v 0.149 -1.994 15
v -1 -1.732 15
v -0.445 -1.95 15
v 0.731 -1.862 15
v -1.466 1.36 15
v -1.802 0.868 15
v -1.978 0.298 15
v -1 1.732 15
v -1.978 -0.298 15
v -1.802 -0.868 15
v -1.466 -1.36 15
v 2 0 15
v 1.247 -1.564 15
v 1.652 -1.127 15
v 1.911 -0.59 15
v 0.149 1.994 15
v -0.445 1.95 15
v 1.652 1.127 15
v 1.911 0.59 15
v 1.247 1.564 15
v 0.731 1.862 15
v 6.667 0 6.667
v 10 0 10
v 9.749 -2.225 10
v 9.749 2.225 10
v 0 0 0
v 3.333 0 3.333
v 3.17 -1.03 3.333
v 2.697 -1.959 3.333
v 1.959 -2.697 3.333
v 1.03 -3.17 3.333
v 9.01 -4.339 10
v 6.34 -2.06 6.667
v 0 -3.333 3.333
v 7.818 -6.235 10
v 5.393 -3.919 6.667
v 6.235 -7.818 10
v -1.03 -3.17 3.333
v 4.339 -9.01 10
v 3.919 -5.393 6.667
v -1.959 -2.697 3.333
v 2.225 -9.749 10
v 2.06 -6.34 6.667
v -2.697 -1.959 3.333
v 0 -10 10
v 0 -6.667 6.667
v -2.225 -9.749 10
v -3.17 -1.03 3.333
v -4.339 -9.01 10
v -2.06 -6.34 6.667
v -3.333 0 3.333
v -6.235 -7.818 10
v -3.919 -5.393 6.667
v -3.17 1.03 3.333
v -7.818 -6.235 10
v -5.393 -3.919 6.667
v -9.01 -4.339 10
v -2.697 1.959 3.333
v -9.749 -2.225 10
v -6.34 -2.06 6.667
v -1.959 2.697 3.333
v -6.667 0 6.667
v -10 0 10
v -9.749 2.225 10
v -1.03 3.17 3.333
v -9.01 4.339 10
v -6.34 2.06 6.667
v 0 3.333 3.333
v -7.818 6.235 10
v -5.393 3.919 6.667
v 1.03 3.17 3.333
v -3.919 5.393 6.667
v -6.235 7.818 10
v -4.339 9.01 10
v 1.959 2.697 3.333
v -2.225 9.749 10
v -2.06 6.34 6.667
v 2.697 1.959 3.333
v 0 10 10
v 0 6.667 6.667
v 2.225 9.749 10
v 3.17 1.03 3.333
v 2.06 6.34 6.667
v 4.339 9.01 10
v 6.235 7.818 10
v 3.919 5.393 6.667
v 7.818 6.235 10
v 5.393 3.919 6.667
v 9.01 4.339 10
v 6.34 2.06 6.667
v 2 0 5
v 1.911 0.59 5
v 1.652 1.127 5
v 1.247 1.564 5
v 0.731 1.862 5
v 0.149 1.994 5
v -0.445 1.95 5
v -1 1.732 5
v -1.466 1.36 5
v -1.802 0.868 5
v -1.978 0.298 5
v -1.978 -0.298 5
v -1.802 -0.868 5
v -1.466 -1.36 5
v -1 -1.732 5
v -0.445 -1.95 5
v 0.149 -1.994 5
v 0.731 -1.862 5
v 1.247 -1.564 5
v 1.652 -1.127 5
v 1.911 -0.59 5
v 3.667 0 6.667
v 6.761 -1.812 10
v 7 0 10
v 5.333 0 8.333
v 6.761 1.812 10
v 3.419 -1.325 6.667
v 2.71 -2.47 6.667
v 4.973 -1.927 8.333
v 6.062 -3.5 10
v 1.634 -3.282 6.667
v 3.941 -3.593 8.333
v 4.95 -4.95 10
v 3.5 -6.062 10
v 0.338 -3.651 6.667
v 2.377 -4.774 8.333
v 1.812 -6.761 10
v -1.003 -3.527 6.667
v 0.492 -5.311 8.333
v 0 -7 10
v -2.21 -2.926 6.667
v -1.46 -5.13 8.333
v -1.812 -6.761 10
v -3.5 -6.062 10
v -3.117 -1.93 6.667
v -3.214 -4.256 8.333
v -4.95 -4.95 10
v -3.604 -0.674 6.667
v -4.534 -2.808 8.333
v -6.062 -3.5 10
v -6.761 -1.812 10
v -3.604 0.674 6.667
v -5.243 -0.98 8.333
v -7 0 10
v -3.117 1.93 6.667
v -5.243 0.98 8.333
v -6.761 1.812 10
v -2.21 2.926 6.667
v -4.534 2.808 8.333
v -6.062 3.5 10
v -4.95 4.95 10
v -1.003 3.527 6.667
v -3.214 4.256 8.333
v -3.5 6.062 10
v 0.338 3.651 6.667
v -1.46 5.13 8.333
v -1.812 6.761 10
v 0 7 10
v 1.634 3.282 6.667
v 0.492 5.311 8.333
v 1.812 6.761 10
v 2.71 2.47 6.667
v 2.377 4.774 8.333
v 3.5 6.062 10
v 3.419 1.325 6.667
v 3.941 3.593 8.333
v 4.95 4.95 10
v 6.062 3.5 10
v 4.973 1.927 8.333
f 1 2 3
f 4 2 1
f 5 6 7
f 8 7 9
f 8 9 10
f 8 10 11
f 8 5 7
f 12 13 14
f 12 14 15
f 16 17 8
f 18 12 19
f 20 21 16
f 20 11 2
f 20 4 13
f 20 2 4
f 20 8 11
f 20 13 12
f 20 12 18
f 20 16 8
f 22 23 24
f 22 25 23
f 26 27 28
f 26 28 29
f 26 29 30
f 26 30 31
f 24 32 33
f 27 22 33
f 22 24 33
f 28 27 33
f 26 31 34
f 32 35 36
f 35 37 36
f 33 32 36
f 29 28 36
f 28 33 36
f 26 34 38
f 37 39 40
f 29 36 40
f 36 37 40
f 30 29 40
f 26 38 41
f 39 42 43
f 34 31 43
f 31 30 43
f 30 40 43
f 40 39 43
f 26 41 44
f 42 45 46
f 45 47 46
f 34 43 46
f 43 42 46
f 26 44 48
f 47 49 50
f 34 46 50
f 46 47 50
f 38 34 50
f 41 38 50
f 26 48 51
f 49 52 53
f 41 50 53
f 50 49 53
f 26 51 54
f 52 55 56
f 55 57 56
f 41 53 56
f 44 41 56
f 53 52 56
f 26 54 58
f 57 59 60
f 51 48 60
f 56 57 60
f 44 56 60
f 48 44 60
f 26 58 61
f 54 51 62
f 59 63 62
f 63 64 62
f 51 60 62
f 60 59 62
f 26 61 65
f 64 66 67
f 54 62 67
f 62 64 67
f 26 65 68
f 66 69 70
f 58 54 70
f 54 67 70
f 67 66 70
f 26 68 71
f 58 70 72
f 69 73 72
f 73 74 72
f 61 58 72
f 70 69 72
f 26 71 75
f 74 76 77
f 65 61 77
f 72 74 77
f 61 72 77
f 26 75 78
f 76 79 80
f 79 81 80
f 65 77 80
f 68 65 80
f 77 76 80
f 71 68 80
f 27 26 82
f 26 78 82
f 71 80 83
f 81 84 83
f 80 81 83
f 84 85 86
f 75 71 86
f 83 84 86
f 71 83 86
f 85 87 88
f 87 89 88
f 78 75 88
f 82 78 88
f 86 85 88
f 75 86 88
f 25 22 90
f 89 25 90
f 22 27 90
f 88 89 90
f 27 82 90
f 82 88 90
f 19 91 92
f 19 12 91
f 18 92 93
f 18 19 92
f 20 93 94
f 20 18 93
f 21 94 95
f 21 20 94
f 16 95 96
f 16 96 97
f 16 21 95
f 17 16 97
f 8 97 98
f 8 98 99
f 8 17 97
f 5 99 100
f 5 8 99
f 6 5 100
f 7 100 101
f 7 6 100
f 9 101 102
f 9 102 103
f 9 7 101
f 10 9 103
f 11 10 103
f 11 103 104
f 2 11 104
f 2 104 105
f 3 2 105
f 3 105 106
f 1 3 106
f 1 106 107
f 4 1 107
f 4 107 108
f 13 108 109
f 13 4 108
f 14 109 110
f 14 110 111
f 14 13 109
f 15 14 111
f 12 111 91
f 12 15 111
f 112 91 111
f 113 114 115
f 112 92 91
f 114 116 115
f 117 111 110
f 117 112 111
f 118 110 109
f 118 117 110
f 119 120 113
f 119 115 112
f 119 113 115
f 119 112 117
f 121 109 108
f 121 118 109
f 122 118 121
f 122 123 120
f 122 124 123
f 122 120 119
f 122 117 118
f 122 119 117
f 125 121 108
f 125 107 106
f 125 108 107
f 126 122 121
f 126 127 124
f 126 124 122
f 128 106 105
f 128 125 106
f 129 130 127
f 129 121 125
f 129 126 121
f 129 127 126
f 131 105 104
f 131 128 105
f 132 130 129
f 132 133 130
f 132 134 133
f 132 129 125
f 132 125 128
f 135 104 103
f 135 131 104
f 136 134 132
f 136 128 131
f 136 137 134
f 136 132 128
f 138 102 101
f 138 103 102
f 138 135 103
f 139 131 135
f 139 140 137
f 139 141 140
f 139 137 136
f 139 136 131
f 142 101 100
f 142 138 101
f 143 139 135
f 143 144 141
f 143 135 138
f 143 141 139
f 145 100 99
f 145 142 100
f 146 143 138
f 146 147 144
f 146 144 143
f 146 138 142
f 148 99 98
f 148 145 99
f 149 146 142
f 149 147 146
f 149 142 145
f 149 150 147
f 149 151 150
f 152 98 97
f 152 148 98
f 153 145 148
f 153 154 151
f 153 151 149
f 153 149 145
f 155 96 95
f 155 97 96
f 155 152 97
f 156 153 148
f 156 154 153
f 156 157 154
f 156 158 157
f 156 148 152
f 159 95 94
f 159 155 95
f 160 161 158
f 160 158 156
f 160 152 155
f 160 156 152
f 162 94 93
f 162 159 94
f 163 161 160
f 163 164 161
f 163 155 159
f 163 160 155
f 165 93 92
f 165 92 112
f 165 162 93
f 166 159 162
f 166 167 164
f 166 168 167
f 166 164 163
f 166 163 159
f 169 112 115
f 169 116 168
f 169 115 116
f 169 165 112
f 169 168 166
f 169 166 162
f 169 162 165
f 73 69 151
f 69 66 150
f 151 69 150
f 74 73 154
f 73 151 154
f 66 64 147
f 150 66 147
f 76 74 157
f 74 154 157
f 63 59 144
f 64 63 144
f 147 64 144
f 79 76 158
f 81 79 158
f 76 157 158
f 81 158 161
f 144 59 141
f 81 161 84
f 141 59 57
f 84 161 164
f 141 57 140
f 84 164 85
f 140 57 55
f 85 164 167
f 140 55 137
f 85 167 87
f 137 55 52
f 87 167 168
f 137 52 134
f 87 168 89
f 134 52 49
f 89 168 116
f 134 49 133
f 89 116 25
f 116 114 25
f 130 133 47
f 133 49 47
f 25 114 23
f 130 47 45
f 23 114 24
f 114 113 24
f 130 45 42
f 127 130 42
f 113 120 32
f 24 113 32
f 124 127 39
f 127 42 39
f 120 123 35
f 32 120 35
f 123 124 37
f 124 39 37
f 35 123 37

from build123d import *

# Parameters (mm, degrees)
F4_R          = 2
F5_DEPTH      = 5
F5_DEPTH_BACK = 8


with BuildPart() as f1:
    # F0 (on Front) → F1 (revolve)
    with BuildSketch(Plane.XZ):
        Polygon((0, 10), (0, 0), (10, 10), align=None)
    revolve(axis=Axis((0, 0, 5), (0, 0, -1)))

    # F2 (on Front) → F3 (revolve, cut)
    with BuildSketch(Plane.XZ):
        Polygon((7, 10), (0, 10), (0, 3), align=None)
    revolve(axis=Axis((0, 0, 6.5), (0, 0, -1)), mode=Mode.SUBTRACT)

    # F4 (on face) → F5 (join, two sides)
    with BuildSketch(Plane.XY.offset(10)) as f5_sk:
        Circle(F4_R)
    extrude(amount=F5_DEPTH)
    extrude(f5_sk.sketch, amount=-F5_DEPTH_BACK)


solid = f1.part
